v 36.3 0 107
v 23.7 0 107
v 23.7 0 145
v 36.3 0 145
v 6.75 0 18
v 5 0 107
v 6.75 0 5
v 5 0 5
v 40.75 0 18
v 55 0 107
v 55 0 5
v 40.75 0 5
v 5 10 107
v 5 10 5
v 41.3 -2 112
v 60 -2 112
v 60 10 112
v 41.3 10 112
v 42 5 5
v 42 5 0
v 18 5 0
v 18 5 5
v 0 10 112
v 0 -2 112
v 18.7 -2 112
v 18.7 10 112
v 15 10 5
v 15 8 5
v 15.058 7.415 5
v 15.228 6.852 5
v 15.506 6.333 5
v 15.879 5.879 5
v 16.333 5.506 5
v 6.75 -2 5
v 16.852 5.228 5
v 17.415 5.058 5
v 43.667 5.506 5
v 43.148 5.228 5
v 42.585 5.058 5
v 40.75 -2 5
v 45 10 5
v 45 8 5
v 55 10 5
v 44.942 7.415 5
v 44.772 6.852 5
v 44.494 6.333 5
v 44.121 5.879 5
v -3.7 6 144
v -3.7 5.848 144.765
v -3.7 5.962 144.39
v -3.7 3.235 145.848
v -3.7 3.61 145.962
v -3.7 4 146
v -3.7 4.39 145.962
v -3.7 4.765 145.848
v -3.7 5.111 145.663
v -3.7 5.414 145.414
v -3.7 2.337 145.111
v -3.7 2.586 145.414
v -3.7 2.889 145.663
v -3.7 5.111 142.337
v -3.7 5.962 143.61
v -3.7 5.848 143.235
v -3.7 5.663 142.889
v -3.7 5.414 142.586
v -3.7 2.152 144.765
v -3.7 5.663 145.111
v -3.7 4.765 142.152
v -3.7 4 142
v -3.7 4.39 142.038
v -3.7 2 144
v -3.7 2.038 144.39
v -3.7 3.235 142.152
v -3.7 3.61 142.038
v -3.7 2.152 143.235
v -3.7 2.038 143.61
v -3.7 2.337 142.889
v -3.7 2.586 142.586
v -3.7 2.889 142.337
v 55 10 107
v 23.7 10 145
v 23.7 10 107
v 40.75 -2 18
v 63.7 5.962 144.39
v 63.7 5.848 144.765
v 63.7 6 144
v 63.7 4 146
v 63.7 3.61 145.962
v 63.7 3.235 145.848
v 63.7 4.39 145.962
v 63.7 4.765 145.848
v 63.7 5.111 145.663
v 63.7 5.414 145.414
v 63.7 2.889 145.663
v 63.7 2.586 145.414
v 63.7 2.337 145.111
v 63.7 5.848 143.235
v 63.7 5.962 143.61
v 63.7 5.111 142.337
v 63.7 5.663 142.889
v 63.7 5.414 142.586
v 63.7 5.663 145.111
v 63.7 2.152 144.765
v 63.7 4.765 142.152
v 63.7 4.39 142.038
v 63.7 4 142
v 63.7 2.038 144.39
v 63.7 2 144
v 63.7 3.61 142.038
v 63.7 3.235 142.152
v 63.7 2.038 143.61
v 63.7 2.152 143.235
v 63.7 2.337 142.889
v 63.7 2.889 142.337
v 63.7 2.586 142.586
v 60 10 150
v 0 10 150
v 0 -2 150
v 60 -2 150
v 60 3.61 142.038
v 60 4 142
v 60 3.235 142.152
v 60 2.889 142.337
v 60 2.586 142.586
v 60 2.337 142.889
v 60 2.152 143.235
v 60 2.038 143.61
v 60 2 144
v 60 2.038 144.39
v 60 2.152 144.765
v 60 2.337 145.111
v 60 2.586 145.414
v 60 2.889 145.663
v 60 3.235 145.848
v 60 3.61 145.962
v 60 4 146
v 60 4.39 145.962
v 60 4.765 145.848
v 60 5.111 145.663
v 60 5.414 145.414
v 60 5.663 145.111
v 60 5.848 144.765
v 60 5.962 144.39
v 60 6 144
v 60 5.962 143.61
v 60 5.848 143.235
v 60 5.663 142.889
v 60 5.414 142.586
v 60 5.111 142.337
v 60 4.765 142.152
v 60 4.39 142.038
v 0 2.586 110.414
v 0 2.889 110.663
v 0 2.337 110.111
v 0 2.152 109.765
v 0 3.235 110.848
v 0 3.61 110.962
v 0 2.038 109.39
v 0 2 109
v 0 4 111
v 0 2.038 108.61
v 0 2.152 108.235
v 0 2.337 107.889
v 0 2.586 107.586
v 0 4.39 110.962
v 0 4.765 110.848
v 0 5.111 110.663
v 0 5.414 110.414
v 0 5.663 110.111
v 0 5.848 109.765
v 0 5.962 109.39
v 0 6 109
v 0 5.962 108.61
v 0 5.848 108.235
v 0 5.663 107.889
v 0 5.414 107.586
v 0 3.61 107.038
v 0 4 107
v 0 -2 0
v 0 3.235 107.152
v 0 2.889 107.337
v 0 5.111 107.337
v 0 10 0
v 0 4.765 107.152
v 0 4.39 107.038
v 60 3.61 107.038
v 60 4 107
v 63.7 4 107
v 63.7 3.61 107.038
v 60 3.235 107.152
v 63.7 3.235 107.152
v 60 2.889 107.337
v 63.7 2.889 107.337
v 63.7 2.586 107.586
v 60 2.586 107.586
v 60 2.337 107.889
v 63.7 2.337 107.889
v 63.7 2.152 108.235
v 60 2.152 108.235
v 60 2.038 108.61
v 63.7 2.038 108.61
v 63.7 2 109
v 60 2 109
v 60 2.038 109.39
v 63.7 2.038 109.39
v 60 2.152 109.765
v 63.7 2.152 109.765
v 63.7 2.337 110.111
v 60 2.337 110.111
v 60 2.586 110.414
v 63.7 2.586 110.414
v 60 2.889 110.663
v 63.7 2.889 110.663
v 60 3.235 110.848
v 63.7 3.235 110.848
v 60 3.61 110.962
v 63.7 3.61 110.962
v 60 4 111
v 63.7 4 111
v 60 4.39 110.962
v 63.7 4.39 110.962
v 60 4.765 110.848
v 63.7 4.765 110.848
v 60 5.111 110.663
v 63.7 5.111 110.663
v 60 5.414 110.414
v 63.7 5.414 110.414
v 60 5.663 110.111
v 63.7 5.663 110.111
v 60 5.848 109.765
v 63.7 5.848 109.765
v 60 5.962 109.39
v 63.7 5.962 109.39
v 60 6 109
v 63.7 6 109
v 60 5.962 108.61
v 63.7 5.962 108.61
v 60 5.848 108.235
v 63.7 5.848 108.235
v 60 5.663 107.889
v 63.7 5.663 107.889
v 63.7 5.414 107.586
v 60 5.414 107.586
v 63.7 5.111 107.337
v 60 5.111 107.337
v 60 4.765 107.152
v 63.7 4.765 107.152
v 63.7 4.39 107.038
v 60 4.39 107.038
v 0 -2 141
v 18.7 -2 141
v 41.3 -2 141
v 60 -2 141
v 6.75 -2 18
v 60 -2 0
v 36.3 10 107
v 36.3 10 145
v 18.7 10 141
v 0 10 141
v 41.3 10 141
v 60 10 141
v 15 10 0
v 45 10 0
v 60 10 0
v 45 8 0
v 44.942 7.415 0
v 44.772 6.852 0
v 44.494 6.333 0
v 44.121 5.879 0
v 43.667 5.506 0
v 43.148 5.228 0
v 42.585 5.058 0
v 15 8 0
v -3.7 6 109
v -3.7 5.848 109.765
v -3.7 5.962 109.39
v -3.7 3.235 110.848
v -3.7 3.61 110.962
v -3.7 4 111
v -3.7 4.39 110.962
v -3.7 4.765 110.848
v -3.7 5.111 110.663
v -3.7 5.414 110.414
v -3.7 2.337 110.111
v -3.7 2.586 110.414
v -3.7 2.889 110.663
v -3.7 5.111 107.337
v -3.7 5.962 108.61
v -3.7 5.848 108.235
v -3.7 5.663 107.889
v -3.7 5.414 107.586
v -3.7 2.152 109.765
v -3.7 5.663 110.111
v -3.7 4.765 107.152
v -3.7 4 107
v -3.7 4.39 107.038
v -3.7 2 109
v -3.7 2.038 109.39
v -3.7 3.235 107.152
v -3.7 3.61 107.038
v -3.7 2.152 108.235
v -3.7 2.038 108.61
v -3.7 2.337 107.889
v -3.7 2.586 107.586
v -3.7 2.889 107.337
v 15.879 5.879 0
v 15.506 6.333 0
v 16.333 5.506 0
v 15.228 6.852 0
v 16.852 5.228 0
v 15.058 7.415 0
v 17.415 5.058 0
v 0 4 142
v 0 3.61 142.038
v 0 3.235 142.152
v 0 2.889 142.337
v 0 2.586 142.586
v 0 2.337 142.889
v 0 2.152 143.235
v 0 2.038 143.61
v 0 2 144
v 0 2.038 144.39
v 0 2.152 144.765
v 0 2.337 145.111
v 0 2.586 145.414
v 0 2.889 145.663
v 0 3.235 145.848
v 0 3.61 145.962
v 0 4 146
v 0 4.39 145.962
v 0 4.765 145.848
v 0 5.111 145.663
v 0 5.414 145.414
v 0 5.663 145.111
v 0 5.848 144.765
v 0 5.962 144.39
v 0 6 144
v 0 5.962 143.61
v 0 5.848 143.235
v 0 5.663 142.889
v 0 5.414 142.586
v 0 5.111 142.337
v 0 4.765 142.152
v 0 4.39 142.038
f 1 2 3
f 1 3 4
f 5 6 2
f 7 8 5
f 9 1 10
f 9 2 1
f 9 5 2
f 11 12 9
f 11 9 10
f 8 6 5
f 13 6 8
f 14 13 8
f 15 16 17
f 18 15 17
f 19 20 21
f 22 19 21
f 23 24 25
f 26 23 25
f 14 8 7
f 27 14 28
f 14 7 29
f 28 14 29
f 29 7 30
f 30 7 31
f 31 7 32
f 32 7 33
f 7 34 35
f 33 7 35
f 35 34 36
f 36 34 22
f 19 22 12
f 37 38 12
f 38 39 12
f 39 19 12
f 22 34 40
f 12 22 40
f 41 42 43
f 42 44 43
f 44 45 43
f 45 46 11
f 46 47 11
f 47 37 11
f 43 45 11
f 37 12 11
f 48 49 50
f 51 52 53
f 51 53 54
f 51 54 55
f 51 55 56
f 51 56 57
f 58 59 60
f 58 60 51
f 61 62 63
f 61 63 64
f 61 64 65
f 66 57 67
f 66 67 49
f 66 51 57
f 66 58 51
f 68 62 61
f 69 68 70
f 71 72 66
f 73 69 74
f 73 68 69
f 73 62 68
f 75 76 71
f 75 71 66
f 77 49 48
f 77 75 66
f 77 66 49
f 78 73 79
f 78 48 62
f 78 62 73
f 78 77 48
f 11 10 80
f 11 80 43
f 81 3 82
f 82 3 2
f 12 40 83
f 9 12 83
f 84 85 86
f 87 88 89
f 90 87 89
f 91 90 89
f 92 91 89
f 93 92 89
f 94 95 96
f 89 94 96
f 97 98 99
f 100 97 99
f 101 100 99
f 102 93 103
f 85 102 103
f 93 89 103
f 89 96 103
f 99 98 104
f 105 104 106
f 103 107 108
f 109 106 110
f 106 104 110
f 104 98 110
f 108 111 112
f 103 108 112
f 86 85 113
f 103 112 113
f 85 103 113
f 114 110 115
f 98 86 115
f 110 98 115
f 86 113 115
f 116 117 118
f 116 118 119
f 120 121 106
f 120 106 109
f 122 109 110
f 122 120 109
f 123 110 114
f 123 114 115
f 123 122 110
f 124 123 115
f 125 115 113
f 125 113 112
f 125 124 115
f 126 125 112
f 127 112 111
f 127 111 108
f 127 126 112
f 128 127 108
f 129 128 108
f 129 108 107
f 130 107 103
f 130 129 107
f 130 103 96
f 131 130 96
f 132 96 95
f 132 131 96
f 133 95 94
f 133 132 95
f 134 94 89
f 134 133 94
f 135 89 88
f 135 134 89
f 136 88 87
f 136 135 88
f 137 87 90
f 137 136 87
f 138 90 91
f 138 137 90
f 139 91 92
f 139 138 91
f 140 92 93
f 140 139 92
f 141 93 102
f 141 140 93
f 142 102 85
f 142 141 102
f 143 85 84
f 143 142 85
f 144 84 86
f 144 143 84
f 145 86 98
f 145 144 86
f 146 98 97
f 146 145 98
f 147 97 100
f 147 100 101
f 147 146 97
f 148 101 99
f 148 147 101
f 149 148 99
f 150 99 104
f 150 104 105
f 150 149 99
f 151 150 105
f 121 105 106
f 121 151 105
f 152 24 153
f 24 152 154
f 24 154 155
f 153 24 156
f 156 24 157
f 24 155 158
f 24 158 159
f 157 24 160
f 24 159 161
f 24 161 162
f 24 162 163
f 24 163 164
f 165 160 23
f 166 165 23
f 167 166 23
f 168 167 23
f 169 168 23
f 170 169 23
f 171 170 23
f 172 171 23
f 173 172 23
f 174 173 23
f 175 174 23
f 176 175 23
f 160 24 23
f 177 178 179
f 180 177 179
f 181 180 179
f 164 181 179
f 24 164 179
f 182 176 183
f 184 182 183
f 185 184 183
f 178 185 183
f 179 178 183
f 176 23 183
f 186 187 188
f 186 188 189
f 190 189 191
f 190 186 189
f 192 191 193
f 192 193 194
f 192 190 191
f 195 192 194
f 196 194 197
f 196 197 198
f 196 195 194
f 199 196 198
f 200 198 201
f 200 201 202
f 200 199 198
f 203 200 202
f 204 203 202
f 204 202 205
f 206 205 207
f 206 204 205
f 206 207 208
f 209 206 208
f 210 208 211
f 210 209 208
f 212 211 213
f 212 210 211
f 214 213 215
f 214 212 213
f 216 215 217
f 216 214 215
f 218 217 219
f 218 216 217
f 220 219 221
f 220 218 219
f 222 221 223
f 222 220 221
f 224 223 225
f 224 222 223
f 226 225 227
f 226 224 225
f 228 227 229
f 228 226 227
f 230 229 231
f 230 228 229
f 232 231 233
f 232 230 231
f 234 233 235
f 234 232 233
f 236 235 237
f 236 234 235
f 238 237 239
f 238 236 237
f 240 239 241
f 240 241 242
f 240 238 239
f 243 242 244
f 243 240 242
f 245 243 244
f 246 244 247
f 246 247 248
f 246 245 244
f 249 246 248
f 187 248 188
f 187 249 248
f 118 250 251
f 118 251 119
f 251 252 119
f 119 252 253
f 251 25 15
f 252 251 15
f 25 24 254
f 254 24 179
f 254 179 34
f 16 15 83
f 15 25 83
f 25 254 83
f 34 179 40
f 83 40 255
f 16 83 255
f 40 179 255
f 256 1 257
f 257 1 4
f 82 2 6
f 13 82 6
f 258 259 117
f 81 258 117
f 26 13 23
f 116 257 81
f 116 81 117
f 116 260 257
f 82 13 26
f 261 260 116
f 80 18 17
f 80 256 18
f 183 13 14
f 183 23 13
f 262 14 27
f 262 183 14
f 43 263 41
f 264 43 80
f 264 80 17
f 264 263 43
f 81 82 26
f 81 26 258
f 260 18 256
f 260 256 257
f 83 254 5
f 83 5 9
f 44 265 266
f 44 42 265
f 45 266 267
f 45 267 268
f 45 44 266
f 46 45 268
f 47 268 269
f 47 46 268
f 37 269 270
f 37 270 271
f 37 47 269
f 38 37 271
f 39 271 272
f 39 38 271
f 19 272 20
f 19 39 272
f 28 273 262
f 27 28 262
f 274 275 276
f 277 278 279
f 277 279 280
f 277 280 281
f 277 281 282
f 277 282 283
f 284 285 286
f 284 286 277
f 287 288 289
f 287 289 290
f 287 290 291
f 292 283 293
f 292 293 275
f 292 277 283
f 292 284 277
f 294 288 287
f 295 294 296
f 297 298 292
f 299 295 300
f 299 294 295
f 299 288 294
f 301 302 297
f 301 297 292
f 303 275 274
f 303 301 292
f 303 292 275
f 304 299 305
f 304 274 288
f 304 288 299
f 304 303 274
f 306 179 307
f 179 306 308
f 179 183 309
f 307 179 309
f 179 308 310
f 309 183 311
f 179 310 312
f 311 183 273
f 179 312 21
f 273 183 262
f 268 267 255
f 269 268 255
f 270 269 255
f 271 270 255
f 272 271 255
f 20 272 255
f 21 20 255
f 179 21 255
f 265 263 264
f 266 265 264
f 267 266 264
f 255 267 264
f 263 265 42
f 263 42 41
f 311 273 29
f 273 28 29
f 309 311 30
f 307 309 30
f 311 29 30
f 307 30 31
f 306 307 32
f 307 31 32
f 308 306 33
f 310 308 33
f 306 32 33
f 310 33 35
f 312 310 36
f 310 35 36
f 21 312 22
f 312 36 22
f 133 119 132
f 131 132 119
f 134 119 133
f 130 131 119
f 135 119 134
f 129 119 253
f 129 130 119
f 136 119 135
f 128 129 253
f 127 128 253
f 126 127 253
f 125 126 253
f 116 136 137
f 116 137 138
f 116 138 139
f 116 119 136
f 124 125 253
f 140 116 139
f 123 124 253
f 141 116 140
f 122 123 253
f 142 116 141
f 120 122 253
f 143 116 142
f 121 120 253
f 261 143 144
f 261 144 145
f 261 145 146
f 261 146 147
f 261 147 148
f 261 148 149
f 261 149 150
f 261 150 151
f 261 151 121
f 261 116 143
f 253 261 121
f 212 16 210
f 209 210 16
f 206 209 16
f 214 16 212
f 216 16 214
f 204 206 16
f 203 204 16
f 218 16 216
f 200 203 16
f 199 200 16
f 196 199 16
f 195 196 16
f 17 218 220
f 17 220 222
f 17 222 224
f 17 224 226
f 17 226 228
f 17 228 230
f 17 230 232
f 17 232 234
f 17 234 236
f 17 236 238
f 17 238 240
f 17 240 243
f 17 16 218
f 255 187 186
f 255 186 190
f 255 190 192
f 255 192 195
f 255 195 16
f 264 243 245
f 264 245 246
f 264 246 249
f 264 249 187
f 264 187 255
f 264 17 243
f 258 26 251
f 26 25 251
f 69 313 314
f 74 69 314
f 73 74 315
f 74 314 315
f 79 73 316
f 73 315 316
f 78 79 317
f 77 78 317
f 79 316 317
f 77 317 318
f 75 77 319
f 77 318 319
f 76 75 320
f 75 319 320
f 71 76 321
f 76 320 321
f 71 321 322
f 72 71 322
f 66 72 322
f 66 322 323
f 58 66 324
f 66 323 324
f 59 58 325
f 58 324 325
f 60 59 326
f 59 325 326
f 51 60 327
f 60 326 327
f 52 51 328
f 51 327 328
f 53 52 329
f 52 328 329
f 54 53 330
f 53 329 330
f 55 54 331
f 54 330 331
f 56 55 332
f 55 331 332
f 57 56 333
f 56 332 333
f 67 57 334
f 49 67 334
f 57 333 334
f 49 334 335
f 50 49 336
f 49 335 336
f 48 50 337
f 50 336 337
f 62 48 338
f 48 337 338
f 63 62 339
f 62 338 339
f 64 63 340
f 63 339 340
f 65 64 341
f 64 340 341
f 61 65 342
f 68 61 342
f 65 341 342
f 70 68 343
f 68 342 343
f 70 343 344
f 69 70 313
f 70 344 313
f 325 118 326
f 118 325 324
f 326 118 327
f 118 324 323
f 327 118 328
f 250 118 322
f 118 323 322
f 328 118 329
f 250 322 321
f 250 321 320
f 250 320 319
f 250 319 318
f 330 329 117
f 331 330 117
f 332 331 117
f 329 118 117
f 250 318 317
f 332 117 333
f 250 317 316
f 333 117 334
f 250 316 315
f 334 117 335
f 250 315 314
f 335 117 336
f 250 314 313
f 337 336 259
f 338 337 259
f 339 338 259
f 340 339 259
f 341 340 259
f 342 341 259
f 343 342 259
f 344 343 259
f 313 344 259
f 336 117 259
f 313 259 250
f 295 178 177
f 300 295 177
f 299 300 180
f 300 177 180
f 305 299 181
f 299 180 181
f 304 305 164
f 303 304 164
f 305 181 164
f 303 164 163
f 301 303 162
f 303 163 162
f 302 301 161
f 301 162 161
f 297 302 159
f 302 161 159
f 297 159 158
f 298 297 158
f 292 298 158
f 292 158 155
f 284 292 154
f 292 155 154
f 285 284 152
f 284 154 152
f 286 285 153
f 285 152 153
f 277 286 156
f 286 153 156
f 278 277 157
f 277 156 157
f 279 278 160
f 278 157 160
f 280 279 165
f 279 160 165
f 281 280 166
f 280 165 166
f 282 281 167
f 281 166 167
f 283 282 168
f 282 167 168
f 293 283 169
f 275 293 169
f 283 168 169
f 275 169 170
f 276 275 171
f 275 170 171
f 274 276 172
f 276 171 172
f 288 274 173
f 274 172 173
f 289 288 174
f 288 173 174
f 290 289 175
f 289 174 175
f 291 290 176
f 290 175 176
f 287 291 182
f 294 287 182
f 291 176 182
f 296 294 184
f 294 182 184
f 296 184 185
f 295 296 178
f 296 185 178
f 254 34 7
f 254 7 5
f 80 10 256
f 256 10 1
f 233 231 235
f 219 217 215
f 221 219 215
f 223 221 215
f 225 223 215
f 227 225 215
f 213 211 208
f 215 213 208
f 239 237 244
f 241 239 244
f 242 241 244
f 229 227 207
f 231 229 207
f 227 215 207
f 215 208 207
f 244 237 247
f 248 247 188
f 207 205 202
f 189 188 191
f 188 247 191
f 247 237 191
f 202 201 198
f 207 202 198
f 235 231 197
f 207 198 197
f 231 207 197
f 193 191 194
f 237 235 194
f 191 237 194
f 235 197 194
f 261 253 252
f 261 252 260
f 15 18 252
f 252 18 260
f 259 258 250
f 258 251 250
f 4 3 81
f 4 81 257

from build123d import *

# Parameters (mm, degrees)
SKETCH1_W               = 60
SKETCH1_H               = 150
SKETCH1_W_2             = 50
SKETCH1_H_2             = 140
BOSS_EXTRUDE1_DEPTH     = 10
SKETCH1_2_W             = 60
SKETCH1_2_H             = 150
SKETCH1_2_W_2           = 50
SKETCH1_2_H_2           = 140
SKETCH1_2_W_3           = 12.5
SKETCH1_2_H_3           = 22.5
BOSS_EXTRUDE2_DEPTH     = 2
SKETCH2_W               = 29
SKETCH2_H               = 12
CUT_EXTRUDE1_DEPTH      = 18.7
SKETCH2_3_R             = 2
BOSS_EXTRUDE3_DEPTH     = 3.7
BOSS_EXTRUDE4_DEPTH     = 10
SKETCH4_W               = 34
SKETCH4_H               = 13
CUT_EXTRUDE2_DEPTH      = 164.406517618
CUT_EXTRUDE2_DEPTH_BACK = 164.406517618
CUT_EXTRUDE3_REACH      = 165.272
SKETCH5_W               = 30
SKETCH5_H               = 5
FILLET1_R               = 3


with BuildPart() as part:
    # Sketch1 → Boss-Extrude1 (new body)
    with BuildSketch(Plane(origin=(0, 0, 0), x_dir=(1, 0, 0), z_dir=(0, 1, 0))):
        with Locations((30, -75)):
            Rectangle(SKETCH1_W, SKETCH1_H)
        with Locations((30, -75)):
            Rectangle(SKETCH1_W_2, SKETCH1_H_2, mode=Mode.SUBTRACT)
    extrude(amount=BOSS_EXTRUDE1_DEPTH)

    # Sketch1<2> → Boss-Extrude2 (add)
    with BuildSketch(Plane(origin=(0, 0, 0), x_dir=(1, 0, 0), z_dir=(0, 1, 0))):
        with Locations((30, -75)):
            Rectangle(SKETCH1_2_W, SKETCH1_2_H)
        with Locations((30, -75)):
            Rectangle(SKETCH1_2_W_2, SKETCH1_2_H_2, mode=Mode.SUBTRACT)
        with Locations((30, -75)):
            Rectangle(SKETCH1_2_W_2, SKETCH1_2_H_2)
        with Locations((30, -34.617801795)):
            Rectangle(SKETCH1_2_W_3, SKETCH1_2_H_3)
    extrude(amount=-BOSS_EXTRUDE2_DEPTH)

    # Sketch2 → Cut-Extrude1 (cut)
    with BuildSketch(Plane.ZY):
        with Locations((126.5, 4)):
            Rectangle(SKETCH2_W, SKETCH2_H)
    cut_extrude1 = extrude(amount=-CUT_EXTRUDE1_DEPTH, mode=Mode.SUBTRACT)

    # Sketch2<3> → Boss-Extrude3 (add)
    with BuildSketch(Plane.ZY):
        with Locations(Location((109, 4, 0), (0, 0, 180))):
            Circle(SKETCH2_3_R)
        with Locations(Location((144, 4, 0), (0, 0, 180))):
            Circle(SKETCH2_3_R)
    boss_extrude3 = extrude(amount=BOSS_EXTRUDE3_DEPTH)

    # Mirror1: Cut-Extrude1, Boss-Extrude3 across plane
    add(cut_extrude1.mirror(Plane.ZY.offset(-30)), mode=Mode.SUBTRACT)
    add(boss_extrude3.mirror(Plane.ZY.offset(-30)))

    # Sketch3 → Boss-Extrude4 (add)
    with BuildSketch(Plane(origin=(0, 0, 0), x_dir=(1, 0, 0), z_dir=(0, 1, 0))):
        Polygon((23.7, -107), (5, -107), (5, -112), (18.7, -112), (18.7, -141), (5, -141), (5, -145), (23.7, -145), align=None)
        Polygon((36.3, -107), (36.3, -145), (55, -145), (55, -141), (41.3, -141), (41.3, -112), (55, -112), (55, -107), align=None)
    extrude(amount=BOSS_EXTRUDE4_DEPTH)

    # Sketch4 → Cut-Extrude2 (cut, two sides)
    with BuildSketch(Plane.XZ.offset(2)) as cut_extrude2_sk:
        with Locations((23.75, 11.5)):
            Rectangle(SKETCH4_W, SKETCH4_H)
    extrude(amount=CUT_EXTRUDE2_DEPTH, mode=Mode.SUBTRACT)
    extrude(cut_extrude2_sk.sketch, amount=-CUT_EXTRUDE2_DEPTH_BACK, mode=Mode.SUBTRACT)

    # Sketch5 → Cut-Extrude3 (cut, up to next)
    with BuildSketch(Plane(origin=(0, 0, 0), x_dir=(-1, 0, 0), z_dir=(0, 0, -1)), mode=Mode.PRIVATE) as cut_extrude3_sk1:
        with Locations((-30, 7.5)):
            Rectangle(SKETCH5_W, SKETCH5_H)
    cut_extrude3_tool1 = extrude(cut_extrude3_sk1.sketch, amount=-CUT_EXTRUDE3_REACH, mode=Mode.PRIVATE) & part.part
    add(cut_extrude3_tool1.solids().sort_by_distance((30, 7.5, 0))[0], mode=Mode.SUBTRACT)

    # Fillet1
    fillet1_edges = [part.edges().sort_by_distance(p)[0] for p in [
        (45, 5, 2.5),
        (15, 5, 2.5),
    ]]
    fillet(fillet1_edges, radius=FILLET1_R)


solid = part.part
